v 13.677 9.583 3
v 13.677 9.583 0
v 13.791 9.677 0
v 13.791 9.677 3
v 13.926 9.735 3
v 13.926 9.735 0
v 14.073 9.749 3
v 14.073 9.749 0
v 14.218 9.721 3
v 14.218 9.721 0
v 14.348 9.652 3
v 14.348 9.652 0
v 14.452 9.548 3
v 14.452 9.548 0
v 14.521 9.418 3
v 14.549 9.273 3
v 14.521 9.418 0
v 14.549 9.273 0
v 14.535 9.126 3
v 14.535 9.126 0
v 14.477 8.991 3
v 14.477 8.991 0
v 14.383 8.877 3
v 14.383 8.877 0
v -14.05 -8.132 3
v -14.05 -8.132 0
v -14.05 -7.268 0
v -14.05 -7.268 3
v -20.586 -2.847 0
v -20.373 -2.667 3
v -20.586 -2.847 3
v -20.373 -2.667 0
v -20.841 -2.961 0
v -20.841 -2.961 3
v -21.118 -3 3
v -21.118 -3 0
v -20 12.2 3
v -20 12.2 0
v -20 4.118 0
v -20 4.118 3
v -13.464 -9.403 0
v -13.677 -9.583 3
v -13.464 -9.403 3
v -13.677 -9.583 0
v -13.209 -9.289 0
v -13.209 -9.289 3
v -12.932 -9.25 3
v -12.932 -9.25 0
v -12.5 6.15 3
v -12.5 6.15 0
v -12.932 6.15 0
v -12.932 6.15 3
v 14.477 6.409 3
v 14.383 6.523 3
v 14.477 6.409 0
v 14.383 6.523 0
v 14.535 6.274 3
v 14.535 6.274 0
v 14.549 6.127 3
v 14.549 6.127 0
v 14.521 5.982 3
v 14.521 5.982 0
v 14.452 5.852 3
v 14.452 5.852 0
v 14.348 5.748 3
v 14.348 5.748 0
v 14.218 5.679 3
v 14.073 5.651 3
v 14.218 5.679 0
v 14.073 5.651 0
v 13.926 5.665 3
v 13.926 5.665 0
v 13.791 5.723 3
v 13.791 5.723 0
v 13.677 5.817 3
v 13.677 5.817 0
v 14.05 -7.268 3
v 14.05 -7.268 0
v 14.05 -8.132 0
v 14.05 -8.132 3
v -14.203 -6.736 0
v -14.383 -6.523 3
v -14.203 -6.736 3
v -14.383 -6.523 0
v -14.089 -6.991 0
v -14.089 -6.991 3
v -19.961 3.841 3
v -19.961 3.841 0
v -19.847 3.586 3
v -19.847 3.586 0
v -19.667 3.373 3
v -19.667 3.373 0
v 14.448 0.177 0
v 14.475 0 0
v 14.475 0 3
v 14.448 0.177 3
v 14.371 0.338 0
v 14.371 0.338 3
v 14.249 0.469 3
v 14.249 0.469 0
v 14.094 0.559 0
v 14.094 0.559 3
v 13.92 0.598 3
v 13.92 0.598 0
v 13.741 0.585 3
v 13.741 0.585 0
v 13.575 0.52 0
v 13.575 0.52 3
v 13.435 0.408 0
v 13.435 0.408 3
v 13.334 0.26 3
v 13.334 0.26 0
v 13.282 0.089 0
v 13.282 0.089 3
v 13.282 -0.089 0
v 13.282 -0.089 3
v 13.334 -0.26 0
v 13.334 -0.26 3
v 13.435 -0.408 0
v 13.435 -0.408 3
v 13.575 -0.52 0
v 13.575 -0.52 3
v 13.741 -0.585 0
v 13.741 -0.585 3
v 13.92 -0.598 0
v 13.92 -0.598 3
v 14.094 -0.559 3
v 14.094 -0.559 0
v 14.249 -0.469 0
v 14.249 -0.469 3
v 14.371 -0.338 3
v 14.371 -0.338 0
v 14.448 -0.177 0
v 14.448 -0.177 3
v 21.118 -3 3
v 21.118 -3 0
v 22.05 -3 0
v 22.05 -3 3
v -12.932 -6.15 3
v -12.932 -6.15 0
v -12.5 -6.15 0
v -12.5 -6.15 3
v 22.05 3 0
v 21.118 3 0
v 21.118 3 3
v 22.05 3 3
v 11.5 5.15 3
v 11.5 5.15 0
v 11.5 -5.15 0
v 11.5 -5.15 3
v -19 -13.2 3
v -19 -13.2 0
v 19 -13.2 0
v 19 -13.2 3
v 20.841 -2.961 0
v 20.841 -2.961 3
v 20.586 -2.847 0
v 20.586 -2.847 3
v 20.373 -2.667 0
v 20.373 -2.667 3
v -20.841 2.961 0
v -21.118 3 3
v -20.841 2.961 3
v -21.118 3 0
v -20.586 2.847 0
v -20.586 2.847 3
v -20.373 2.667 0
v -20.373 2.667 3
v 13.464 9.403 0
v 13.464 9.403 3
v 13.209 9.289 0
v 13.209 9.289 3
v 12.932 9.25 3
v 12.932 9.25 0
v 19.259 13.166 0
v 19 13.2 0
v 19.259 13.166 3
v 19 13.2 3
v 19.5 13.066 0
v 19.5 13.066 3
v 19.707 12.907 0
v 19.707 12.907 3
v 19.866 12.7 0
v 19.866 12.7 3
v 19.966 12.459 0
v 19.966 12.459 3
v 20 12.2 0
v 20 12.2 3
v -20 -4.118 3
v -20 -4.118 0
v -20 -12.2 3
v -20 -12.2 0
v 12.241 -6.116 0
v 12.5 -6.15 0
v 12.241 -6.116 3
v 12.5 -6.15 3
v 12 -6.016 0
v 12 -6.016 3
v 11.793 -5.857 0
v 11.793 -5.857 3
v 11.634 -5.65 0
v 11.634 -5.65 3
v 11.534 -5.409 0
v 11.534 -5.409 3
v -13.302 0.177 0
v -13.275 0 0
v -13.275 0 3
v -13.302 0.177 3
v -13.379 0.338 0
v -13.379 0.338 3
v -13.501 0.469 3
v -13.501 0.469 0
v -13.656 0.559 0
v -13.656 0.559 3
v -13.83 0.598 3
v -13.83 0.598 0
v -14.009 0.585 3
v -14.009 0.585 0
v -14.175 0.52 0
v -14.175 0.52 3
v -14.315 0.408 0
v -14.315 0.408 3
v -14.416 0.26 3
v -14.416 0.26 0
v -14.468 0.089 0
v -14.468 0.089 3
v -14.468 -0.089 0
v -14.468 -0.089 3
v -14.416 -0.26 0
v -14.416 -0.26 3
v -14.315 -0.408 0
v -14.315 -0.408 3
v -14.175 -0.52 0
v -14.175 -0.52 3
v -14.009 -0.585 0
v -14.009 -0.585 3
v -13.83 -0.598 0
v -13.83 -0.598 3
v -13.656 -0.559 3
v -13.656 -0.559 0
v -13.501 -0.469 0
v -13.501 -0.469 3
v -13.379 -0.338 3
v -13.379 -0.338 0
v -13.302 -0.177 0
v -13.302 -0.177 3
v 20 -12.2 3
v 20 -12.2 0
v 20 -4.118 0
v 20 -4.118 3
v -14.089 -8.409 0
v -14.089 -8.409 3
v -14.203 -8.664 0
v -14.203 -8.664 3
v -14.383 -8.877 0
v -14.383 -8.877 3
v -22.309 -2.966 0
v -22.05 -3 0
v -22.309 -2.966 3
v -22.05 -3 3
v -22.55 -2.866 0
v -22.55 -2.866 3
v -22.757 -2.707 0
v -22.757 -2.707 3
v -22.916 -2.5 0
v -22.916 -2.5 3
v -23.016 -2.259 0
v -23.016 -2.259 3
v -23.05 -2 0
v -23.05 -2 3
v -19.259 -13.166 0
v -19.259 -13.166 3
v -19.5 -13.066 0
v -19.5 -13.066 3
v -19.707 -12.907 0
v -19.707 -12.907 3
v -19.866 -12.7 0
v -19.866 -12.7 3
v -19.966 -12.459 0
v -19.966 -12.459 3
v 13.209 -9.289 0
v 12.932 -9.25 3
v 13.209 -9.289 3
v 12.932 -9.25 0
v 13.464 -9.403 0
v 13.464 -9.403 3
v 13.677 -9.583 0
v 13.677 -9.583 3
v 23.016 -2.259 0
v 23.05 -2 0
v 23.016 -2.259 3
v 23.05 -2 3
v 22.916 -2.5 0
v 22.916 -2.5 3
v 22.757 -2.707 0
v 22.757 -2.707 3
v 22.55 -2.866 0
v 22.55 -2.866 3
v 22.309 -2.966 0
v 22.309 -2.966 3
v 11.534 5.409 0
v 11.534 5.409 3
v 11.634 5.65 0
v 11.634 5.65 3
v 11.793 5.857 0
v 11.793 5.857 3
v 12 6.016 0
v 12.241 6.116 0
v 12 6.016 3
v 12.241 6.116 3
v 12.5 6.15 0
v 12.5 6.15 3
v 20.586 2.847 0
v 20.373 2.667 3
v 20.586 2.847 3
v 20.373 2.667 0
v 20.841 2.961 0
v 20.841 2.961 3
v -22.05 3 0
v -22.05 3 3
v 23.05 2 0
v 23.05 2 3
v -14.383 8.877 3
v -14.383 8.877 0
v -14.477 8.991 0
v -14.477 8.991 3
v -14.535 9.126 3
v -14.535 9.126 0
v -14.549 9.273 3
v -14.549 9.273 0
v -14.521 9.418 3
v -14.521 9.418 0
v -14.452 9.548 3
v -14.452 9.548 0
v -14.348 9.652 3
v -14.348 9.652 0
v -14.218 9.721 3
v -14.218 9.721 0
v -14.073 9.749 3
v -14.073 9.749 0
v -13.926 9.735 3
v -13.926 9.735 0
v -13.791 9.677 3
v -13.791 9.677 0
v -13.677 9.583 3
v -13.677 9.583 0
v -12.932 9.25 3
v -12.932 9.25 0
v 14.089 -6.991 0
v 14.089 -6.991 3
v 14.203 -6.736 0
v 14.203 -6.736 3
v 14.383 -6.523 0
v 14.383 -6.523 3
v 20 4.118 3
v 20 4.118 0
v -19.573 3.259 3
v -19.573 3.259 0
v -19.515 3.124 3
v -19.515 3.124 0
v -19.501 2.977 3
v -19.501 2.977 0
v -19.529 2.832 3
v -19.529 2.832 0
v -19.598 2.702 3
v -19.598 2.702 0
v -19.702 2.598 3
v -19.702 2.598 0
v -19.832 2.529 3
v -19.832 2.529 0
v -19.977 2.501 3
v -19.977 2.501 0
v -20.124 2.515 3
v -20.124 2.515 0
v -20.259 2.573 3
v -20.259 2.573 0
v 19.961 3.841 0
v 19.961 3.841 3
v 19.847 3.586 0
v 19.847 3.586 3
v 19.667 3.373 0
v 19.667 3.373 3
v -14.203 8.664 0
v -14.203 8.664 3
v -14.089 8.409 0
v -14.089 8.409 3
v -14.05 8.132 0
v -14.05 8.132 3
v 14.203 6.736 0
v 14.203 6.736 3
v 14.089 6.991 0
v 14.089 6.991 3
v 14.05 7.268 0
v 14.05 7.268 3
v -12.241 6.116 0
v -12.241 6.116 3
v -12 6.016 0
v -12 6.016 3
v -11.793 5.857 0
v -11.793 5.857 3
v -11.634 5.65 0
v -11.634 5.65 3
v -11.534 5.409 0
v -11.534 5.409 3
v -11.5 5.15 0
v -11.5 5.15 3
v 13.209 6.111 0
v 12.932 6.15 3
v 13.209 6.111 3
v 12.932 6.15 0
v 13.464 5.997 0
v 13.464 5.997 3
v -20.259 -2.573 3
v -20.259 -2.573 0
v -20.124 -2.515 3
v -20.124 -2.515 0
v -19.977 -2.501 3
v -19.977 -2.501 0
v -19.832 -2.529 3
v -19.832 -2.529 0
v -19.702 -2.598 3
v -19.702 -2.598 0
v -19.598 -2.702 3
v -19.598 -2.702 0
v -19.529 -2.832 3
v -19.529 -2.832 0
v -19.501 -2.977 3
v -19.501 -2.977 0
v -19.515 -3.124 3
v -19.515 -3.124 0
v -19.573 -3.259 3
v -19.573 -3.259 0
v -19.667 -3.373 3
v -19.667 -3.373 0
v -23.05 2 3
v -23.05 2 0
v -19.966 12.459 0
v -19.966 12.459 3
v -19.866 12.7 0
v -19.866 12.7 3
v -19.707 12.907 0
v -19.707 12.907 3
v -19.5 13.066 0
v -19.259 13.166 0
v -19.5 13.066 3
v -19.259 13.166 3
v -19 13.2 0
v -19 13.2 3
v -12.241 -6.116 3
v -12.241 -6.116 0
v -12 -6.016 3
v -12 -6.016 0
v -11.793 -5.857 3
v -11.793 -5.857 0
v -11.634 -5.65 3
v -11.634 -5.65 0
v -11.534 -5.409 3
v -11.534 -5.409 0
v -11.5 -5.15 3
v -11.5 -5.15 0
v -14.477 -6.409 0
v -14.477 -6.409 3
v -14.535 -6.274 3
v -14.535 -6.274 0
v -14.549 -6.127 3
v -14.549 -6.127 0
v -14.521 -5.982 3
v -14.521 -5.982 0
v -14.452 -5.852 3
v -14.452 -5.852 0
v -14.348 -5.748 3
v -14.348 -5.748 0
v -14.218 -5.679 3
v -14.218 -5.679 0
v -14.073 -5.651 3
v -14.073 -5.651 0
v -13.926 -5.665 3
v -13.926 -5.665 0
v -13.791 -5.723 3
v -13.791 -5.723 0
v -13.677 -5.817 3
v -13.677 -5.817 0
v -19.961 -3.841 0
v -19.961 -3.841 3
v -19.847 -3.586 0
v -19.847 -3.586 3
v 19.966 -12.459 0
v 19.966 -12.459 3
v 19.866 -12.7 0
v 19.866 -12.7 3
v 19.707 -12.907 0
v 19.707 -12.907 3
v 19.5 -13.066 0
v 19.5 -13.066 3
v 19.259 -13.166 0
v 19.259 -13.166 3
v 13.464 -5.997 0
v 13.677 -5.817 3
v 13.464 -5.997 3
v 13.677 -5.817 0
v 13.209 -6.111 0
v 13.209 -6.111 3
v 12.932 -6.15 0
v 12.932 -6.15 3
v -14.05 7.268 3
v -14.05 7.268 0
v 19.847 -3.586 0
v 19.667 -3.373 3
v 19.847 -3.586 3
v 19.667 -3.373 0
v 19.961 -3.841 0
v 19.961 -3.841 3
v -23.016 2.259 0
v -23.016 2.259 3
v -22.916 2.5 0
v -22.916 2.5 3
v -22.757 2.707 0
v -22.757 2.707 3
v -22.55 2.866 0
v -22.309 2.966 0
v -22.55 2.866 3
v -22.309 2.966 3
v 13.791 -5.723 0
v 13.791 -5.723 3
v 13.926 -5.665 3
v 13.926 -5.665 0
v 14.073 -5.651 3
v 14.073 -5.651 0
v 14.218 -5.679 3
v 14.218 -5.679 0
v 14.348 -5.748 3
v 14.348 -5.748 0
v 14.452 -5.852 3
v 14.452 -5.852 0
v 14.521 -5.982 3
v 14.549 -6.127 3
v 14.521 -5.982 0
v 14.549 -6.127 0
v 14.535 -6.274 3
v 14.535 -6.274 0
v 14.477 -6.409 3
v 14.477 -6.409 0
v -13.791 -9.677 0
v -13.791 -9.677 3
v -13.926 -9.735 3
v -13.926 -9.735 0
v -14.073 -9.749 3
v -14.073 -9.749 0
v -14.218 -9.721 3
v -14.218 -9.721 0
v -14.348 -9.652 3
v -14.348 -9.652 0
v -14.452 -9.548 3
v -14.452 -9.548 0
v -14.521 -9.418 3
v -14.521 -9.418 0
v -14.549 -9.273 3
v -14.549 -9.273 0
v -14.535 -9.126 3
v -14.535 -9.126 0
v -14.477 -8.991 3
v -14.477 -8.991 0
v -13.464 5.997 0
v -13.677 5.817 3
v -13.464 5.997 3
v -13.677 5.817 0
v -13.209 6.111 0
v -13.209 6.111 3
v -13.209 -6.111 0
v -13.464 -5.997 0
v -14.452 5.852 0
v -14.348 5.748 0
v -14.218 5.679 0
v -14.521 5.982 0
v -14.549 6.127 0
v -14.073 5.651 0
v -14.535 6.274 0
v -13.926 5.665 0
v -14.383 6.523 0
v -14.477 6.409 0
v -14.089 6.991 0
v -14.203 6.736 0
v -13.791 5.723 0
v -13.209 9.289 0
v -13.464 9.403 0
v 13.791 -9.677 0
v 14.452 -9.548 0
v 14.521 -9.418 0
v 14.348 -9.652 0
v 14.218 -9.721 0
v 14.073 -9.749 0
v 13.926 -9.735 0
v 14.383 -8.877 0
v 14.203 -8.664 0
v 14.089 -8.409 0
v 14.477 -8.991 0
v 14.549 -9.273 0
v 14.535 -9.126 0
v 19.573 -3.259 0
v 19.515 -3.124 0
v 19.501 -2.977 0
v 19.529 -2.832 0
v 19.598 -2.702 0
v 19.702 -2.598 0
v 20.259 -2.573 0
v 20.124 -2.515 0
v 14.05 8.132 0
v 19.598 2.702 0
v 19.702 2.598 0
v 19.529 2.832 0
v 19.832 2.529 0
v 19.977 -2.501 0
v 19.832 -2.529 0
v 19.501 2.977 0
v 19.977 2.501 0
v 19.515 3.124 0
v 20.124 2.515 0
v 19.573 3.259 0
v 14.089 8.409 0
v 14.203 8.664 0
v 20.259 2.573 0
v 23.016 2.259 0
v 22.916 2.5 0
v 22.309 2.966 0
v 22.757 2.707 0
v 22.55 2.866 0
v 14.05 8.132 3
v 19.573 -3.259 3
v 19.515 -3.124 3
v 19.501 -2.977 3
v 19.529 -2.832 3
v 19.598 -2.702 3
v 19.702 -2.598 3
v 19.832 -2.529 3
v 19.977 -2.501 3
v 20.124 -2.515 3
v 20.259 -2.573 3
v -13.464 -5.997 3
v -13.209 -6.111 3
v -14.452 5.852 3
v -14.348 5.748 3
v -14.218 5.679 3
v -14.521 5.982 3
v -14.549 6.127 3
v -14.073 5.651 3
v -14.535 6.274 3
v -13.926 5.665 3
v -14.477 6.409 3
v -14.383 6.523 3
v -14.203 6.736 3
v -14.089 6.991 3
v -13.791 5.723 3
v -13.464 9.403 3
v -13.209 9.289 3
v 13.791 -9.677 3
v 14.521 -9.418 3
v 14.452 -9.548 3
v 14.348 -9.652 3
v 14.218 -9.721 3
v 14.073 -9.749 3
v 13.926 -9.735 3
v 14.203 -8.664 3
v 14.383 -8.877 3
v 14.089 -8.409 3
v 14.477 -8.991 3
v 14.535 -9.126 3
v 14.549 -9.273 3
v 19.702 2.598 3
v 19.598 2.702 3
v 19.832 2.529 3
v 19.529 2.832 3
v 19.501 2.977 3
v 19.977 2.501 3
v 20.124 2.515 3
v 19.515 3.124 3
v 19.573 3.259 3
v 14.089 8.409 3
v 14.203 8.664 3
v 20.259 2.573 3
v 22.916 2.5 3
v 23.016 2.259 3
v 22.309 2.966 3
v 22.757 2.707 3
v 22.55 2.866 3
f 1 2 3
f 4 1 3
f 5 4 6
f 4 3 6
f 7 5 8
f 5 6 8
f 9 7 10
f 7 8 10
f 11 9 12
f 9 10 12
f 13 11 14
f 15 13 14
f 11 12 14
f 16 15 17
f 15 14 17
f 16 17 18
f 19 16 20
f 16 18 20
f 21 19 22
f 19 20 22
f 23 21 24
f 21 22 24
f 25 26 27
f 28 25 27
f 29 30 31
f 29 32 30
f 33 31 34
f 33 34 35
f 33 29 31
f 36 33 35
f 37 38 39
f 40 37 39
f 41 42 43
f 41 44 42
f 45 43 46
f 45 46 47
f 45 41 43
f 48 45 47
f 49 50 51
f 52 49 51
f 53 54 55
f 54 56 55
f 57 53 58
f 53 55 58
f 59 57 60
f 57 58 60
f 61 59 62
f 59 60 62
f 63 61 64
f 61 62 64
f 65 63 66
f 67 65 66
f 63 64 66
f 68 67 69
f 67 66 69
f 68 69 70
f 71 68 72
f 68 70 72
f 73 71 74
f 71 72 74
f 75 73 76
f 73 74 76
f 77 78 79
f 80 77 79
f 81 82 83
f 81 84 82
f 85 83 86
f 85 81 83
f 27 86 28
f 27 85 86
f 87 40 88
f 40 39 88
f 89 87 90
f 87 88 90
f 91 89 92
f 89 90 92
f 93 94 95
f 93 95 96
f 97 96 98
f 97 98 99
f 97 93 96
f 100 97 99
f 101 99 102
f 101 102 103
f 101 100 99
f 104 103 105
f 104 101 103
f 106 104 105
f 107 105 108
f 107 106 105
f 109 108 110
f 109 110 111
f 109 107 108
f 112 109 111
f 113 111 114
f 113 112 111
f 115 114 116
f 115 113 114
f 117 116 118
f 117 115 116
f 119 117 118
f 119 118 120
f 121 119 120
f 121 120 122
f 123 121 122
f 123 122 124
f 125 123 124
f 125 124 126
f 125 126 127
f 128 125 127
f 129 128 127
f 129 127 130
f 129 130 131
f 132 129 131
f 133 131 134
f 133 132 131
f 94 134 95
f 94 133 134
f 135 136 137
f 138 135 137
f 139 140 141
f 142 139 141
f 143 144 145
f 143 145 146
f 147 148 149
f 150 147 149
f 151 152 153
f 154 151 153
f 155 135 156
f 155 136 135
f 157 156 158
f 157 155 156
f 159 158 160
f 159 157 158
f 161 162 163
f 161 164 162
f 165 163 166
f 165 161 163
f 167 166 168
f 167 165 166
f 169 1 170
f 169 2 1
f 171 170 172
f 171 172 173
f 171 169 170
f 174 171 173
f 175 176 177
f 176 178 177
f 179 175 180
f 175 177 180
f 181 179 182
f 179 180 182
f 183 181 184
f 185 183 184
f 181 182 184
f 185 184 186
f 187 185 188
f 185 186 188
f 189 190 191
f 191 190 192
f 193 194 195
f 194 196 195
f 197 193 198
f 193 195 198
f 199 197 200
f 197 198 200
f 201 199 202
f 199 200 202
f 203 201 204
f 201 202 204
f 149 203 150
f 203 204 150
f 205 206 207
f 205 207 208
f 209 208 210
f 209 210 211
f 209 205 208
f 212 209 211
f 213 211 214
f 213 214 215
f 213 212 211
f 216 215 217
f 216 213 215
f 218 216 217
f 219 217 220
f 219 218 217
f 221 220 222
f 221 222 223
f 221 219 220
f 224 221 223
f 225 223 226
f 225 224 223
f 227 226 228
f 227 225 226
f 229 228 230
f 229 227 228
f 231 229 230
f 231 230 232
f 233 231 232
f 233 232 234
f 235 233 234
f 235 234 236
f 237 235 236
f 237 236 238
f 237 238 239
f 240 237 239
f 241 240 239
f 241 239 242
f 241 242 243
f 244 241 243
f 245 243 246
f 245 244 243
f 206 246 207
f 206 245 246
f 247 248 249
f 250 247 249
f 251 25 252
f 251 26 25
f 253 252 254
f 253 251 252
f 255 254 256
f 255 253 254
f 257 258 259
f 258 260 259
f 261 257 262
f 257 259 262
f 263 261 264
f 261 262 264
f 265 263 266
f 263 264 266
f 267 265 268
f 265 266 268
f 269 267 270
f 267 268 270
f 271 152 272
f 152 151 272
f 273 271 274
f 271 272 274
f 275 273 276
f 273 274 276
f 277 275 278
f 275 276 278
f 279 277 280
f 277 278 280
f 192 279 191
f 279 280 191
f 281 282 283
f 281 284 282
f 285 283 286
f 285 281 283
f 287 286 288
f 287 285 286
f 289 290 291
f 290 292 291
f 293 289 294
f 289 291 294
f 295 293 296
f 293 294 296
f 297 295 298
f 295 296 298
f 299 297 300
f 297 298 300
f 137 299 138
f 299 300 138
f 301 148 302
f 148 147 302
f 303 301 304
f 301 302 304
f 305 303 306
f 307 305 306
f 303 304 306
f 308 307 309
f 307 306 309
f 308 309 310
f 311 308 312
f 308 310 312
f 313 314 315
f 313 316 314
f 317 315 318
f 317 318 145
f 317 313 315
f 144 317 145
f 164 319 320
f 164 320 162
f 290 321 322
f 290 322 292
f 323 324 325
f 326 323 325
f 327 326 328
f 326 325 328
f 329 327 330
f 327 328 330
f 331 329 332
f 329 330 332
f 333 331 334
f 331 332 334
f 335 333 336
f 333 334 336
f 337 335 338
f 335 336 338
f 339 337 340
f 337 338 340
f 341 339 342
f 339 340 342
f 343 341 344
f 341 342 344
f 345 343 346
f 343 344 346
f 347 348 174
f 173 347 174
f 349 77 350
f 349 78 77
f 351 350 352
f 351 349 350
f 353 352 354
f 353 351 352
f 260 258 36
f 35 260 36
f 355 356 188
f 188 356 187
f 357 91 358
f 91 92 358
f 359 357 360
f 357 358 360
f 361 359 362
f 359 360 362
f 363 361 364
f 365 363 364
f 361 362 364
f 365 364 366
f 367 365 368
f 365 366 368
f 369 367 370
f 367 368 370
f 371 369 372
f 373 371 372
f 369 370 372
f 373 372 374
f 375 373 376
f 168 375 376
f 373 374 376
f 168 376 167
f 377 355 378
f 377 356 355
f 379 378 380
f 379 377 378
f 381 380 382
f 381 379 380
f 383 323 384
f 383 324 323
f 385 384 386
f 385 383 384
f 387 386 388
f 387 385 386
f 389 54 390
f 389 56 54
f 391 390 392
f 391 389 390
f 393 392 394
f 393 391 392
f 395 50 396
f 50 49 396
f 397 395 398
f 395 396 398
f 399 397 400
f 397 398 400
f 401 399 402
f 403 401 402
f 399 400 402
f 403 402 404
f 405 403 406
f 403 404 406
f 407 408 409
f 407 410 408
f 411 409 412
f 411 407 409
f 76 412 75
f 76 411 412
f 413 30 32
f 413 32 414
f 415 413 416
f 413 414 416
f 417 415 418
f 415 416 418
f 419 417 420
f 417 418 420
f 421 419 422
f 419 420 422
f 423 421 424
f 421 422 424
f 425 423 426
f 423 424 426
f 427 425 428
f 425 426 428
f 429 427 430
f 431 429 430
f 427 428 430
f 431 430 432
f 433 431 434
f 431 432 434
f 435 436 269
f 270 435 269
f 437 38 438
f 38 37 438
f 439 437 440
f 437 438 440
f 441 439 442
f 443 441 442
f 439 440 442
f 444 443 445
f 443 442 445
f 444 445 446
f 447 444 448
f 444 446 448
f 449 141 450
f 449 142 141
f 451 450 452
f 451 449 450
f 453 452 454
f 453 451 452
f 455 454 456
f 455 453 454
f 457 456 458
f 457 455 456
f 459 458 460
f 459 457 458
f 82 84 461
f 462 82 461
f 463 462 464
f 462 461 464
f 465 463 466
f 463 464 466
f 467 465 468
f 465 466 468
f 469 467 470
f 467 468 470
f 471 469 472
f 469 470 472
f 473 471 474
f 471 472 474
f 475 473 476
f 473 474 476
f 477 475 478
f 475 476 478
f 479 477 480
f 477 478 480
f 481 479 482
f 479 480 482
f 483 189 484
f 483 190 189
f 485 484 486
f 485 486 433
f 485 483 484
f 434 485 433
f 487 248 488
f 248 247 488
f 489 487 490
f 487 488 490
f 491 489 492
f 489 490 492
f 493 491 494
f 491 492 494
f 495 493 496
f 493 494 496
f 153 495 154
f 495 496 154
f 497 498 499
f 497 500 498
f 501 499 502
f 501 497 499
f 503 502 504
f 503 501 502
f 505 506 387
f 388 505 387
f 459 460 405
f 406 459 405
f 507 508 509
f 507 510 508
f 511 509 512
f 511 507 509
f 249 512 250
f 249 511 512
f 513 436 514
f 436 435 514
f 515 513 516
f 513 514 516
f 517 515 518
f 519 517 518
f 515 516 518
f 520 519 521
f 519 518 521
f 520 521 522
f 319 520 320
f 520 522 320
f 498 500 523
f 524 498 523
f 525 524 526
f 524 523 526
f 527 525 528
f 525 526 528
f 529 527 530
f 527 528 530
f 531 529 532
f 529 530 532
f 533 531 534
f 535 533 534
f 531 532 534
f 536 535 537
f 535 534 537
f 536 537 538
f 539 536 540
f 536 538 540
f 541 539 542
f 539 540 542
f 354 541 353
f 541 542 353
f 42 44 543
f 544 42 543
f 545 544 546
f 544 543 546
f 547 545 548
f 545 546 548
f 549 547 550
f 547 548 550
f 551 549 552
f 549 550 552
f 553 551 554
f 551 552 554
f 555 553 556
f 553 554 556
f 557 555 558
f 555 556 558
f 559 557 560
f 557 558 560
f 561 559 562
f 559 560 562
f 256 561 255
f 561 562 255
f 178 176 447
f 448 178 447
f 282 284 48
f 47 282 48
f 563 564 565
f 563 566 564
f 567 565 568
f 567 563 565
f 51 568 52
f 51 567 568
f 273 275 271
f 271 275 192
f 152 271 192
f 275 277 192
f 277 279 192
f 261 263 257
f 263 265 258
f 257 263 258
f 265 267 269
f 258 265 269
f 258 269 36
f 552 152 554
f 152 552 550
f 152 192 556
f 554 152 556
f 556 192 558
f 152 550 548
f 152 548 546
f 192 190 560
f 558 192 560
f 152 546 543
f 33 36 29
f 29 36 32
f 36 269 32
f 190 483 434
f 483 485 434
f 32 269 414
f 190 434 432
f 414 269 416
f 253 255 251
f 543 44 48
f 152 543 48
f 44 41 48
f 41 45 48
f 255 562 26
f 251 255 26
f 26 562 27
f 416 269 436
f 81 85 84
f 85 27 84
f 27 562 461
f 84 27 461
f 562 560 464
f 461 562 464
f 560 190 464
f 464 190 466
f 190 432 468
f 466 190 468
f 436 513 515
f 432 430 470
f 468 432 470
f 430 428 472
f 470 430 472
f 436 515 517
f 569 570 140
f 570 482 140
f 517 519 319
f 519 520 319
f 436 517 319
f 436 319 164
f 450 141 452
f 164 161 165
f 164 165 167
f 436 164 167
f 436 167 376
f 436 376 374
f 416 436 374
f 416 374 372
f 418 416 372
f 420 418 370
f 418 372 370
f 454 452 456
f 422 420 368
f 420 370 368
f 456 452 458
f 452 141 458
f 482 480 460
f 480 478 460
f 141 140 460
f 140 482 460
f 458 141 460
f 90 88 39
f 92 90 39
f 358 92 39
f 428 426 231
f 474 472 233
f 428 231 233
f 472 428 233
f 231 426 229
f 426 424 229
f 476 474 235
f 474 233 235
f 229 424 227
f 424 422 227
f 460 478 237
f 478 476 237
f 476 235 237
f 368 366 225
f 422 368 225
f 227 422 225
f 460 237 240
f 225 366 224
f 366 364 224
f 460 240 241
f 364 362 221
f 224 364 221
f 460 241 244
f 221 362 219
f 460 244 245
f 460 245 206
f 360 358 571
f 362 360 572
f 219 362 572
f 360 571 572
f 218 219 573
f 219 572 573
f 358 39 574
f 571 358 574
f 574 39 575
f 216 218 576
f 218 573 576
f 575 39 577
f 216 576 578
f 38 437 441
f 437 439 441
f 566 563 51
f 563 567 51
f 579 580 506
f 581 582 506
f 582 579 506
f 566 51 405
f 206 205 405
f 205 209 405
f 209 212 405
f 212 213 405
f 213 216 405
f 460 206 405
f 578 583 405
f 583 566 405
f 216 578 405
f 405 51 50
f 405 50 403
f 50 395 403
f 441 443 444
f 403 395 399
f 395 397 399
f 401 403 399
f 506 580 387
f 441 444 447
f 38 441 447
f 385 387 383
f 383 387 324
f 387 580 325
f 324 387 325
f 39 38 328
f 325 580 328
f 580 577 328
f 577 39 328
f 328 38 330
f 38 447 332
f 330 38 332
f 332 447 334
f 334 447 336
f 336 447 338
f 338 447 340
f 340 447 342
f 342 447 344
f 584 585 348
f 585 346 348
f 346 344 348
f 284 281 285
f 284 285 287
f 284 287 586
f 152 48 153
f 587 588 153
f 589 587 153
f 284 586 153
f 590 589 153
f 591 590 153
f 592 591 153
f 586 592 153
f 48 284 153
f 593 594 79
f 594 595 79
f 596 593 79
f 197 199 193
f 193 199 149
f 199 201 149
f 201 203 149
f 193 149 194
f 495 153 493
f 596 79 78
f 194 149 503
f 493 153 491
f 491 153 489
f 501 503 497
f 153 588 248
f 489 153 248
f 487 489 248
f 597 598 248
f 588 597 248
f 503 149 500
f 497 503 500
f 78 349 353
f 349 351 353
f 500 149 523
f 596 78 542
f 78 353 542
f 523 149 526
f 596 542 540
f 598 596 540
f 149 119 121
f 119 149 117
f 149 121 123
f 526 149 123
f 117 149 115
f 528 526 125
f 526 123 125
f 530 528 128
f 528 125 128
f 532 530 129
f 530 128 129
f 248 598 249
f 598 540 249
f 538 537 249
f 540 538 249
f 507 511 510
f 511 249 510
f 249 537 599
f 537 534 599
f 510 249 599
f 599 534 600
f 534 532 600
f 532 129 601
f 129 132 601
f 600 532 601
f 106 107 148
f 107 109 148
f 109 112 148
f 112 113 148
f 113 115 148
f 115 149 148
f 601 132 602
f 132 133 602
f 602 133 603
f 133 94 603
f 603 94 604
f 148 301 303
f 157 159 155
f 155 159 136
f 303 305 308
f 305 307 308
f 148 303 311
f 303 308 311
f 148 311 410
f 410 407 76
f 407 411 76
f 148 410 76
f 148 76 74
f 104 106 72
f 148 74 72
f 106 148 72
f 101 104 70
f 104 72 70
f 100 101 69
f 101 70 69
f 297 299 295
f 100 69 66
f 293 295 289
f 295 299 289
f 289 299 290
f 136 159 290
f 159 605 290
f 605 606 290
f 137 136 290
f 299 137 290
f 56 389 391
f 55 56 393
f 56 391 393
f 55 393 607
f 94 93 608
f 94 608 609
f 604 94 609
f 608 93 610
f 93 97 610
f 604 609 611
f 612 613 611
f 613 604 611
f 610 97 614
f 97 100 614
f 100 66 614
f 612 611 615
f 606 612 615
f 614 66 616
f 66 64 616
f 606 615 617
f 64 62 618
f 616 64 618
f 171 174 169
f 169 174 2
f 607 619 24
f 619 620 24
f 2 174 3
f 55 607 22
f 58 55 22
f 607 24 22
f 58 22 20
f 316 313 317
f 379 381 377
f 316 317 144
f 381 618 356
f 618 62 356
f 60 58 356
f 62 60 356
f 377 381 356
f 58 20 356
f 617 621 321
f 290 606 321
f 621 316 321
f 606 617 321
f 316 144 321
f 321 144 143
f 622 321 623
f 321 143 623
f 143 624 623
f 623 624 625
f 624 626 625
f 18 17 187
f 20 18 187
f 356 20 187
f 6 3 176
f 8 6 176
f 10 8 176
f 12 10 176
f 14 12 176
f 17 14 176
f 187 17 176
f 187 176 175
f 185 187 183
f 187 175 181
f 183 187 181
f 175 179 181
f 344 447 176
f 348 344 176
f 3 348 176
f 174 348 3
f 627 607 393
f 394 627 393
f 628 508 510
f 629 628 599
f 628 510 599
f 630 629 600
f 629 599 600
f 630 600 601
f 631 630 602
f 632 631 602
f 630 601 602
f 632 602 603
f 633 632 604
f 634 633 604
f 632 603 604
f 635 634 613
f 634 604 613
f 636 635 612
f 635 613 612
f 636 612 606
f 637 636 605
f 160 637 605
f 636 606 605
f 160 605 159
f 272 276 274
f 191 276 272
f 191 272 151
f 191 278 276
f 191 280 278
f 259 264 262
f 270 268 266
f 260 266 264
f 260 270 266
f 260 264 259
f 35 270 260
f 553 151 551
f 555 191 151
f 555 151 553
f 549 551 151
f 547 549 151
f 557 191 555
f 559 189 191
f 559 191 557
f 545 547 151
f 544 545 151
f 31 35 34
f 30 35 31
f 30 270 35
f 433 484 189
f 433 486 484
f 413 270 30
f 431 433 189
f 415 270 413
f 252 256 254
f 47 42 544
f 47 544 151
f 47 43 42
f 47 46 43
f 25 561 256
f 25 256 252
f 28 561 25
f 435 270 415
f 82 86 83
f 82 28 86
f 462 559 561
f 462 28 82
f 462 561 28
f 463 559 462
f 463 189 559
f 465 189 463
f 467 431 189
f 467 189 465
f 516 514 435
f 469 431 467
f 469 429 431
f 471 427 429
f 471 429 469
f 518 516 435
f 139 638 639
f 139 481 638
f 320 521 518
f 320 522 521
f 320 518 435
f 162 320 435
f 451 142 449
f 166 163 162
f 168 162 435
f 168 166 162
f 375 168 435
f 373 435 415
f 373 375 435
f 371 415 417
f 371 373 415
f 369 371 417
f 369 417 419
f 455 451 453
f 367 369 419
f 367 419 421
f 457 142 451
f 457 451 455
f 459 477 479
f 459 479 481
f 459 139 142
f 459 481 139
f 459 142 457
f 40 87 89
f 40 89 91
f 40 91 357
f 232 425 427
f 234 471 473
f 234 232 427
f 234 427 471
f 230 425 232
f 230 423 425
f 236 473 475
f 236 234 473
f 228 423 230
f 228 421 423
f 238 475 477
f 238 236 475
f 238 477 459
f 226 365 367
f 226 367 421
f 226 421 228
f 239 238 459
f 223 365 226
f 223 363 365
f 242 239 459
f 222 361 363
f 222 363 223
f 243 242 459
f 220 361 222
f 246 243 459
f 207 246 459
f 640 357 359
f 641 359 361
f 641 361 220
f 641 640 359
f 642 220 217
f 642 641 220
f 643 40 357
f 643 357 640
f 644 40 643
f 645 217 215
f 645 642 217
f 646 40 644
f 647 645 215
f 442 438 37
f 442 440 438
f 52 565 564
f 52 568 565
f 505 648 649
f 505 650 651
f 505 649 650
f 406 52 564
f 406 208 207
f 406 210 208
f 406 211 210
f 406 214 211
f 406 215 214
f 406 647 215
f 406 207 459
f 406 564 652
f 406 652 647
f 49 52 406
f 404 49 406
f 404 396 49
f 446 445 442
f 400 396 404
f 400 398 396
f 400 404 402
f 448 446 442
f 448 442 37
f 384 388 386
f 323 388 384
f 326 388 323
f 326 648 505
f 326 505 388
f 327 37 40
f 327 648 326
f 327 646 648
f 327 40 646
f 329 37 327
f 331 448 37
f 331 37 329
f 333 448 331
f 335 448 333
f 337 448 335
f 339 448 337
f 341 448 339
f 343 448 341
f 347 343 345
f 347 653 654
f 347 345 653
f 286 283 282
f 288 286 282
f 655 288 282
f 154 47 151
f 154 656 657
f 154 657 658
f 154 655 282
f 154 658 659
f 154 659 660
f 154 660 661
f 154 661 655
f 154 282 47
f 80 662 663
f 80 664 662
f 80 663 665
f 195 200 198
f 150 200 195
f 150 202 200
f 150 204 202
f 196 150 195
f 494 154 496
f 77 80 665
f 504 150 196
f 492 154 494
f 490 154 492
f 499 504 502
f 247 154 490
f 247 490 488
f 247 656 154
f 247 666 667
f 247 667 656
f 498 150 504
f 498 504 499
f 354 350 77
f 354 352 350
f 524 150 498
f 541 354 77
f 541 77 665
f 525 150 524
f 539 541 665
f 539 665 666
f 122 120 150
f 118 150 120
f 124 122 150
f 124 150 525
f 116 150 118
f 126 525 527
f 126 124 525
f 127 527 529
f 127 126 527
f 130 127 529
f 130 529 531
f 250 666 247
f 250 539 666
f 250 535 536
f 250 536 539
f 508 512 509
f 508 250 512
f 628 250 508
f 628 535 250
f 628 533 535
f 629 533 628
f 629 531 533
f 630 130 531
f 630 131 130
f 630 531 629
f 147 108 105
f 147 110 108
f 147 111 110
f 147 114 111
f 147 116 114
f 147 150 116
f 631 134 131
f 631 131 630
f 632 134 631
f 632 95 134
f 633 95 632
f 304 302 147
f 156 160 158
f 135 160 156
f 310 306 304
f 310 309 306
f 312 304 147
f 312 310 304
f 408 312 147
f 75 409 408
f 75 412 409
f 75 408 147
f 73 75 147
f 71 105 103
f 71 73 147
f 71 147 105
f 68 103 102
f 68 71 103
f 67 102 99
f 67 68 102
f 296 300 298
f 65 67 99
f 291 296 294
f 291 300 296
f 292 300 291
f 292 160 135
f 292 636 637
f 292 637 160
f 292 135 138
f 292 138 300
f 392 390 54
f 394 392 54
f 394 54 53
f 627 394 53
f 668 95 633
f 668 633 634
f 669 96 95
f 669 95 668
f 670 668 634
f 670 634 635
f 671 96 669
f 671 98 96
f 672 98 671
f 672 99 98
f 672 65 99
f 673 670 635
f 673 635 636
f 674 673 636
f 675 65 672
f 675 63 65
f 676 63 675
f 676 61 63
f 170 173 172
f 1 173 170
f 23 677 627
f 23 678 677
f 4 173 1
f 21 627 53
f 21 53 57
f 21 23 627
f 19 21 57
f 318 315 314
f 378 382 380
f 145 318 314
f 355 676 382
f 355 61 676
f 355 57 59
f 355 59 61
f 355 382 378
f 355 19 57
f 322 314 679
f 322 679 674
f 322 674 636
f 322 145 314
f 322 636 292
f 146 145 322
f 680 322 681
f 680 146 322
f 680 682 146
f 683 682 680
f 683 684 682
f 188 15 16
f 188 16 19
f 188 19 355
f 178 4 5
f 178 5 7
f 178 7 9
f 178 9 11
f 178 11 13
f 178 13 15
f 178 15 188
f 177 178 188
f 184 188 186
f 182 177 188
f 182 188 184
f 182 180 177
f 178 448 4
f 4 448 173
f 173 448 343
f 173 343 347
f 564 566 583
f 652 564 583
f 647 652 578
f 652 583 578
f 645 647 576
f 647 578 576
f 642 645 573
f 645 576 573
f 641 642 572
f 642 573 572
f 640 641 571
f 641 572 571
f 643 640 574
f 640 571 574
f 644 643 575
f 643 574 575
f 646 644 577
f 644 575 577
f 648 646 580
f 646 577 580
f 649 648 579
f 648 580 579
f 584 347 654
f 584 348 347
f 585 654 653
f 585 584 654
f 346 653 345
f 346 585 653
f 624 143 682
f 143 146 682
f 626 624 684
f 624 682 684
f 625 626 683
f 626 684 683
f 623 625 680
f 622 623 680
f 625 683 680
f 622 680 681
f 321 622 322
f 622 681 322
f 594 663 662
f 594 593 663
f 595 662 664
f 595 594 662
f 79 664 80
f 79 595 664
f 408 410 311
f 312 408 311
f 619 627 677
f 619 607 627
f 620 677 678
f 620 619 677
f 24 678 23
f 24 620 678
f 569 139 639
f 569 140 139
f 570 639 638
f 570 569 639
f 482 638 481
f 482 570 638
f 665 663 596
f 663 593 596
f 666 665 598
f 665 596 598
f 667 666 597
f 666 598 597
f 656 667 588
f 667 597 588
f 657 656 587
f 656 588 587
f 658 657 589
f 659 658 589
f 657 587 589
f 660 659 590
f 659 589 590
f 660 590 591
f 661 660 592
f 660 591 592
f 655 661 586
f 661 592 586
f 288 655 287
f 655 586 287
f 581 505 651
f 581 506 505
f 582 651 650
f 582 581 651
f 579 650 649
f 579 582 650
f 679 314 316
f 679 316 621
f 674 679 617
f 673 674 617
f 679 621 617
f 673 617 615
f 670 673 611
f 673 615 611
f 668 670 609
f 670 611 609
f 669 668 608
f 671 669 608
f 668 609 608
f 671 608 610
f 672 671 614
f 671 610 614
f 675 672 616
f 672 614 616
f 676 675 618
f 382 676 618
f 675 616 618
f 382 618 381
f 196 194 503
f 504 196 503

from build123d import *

# Parameters (mm, degrees)
F0_R     = 0.6
F1_DEPTH = 3
F2_W     = 3.05
F2_H     = 6
F3_DEPTH = 3
F5_D     = 1
F6_R     = 1


with BuildPart() as f1:
    # F0 (on Top) → F1 (new body)
    with BuildSketch(Plane.XY):
        Polygon((-20, 13.2), (-20, -13.2), (0, -13.2), (20, -13.2), (20, 13.2), align=None)
        with Locations((-13.875, 0)):
            Circle(F0_R, mode=Mode.SUBTRACT)
        Polygon((-14.05, 6.15), (-14.05, 9.25), (14.05, 9.25), (14.05, 6.15), (11.5, 6.15), (11.5, -6.15), (14.05, -6.15), (14.05, -9.25), (-14.05, -9.25), (-14.05, -6.15), (-11.5, -6.15), (-11.5, 6.15), align=None, mode=Mode.SUBTRACT)
        with Locations((13.875, 0)):
            Circle(F0_R, mode=Mode.SUBTRACT)
    extrude(amount=F1_DEPTH)

    # F2 (on face) → F3 (join, through all)
    with BuildSketch(Plane(origin=(0, 0, 0), x_dir=(1, 0, 0), z_dir=(0, 0, -1))):
        with Locations((-21.525, 0)):
            Rectangle(F2_W, F2_H)
        with Locations((21.525, 0)):
            Rectangle(F2_W, F2_H)
    extrude(amount=-F3_DEPTH)

    # F5 (through all)
    with Locations(Plane.XY.offset(3)):
        with Locations((-14.05, 9.25), (-14.05, 6.15), (-20, 3), (-20, -3), (-14.05, -6.15), (-14.05, -9.25), (14.05, -6.15), (14.05, -9.25), (20, -3), (20, 3), (14.05, 6.15), (14.05, 9.25)):
            Hole(F5_D / 2)

    # F6
    f6_edges = [f1.edges().sort_by_distance(p)[0] for p in [
        (-20, 13.2, 1.5),
        (-23.05, 3, 1.5),
        (-23.05, -3, 1.5),
        (-20, -13.2, 1.5),
        (-11.5, 6.15, 1.5),
        (11.5, -6.15, 1.5),
        (11.5, 6.15, 1.5),
        (23.05, 3, 1.5),
        (20, 13.2, 1.5),
        (23.05, -3, 1.5),
        (20, -13.2, 1.5),
        (-11.5, -6.15, 1.5),
        (-20, 3.5, 1.5),
        (20, 3.5, 1.5),
        (20.5, 3, 1.5),
        (20.5, -3, 1.5),
        (20, -3.5, 1.5),
        (-20, -3.5, 1.5),
        (-20.5, -3, 1.5),
        (-20.5, 3, 1.5),
        (-13.55, 6.15, 1.5),
        (-13.55, -6.15, 1.5),
        (-14.05, -6.65, 1.5),
        (-14.05, -8.75, 1.5),
        (-13.55, -9.25, 1.5),
        (13.55, -9.25, 1.5),
        (14.05, -8.75, 1.5),
        (14.05, -6.65, 1.5),
        (13.55, -6.15, 1.5),
        (13.55, 6.15, 1.5),
        (14.05, 6.65, 1.5),
        (14.05, 8.75, 1.5),
        (13.55, 9.25, 1.5),
        (-13.55, 9.25, 1.5),
        (-14.05, 8.75, 1.5),
        (-14.05, 6.65, 1.5),
    ]]
    fillet(f6_edges, radius=F6_R)


solid = f1.part
